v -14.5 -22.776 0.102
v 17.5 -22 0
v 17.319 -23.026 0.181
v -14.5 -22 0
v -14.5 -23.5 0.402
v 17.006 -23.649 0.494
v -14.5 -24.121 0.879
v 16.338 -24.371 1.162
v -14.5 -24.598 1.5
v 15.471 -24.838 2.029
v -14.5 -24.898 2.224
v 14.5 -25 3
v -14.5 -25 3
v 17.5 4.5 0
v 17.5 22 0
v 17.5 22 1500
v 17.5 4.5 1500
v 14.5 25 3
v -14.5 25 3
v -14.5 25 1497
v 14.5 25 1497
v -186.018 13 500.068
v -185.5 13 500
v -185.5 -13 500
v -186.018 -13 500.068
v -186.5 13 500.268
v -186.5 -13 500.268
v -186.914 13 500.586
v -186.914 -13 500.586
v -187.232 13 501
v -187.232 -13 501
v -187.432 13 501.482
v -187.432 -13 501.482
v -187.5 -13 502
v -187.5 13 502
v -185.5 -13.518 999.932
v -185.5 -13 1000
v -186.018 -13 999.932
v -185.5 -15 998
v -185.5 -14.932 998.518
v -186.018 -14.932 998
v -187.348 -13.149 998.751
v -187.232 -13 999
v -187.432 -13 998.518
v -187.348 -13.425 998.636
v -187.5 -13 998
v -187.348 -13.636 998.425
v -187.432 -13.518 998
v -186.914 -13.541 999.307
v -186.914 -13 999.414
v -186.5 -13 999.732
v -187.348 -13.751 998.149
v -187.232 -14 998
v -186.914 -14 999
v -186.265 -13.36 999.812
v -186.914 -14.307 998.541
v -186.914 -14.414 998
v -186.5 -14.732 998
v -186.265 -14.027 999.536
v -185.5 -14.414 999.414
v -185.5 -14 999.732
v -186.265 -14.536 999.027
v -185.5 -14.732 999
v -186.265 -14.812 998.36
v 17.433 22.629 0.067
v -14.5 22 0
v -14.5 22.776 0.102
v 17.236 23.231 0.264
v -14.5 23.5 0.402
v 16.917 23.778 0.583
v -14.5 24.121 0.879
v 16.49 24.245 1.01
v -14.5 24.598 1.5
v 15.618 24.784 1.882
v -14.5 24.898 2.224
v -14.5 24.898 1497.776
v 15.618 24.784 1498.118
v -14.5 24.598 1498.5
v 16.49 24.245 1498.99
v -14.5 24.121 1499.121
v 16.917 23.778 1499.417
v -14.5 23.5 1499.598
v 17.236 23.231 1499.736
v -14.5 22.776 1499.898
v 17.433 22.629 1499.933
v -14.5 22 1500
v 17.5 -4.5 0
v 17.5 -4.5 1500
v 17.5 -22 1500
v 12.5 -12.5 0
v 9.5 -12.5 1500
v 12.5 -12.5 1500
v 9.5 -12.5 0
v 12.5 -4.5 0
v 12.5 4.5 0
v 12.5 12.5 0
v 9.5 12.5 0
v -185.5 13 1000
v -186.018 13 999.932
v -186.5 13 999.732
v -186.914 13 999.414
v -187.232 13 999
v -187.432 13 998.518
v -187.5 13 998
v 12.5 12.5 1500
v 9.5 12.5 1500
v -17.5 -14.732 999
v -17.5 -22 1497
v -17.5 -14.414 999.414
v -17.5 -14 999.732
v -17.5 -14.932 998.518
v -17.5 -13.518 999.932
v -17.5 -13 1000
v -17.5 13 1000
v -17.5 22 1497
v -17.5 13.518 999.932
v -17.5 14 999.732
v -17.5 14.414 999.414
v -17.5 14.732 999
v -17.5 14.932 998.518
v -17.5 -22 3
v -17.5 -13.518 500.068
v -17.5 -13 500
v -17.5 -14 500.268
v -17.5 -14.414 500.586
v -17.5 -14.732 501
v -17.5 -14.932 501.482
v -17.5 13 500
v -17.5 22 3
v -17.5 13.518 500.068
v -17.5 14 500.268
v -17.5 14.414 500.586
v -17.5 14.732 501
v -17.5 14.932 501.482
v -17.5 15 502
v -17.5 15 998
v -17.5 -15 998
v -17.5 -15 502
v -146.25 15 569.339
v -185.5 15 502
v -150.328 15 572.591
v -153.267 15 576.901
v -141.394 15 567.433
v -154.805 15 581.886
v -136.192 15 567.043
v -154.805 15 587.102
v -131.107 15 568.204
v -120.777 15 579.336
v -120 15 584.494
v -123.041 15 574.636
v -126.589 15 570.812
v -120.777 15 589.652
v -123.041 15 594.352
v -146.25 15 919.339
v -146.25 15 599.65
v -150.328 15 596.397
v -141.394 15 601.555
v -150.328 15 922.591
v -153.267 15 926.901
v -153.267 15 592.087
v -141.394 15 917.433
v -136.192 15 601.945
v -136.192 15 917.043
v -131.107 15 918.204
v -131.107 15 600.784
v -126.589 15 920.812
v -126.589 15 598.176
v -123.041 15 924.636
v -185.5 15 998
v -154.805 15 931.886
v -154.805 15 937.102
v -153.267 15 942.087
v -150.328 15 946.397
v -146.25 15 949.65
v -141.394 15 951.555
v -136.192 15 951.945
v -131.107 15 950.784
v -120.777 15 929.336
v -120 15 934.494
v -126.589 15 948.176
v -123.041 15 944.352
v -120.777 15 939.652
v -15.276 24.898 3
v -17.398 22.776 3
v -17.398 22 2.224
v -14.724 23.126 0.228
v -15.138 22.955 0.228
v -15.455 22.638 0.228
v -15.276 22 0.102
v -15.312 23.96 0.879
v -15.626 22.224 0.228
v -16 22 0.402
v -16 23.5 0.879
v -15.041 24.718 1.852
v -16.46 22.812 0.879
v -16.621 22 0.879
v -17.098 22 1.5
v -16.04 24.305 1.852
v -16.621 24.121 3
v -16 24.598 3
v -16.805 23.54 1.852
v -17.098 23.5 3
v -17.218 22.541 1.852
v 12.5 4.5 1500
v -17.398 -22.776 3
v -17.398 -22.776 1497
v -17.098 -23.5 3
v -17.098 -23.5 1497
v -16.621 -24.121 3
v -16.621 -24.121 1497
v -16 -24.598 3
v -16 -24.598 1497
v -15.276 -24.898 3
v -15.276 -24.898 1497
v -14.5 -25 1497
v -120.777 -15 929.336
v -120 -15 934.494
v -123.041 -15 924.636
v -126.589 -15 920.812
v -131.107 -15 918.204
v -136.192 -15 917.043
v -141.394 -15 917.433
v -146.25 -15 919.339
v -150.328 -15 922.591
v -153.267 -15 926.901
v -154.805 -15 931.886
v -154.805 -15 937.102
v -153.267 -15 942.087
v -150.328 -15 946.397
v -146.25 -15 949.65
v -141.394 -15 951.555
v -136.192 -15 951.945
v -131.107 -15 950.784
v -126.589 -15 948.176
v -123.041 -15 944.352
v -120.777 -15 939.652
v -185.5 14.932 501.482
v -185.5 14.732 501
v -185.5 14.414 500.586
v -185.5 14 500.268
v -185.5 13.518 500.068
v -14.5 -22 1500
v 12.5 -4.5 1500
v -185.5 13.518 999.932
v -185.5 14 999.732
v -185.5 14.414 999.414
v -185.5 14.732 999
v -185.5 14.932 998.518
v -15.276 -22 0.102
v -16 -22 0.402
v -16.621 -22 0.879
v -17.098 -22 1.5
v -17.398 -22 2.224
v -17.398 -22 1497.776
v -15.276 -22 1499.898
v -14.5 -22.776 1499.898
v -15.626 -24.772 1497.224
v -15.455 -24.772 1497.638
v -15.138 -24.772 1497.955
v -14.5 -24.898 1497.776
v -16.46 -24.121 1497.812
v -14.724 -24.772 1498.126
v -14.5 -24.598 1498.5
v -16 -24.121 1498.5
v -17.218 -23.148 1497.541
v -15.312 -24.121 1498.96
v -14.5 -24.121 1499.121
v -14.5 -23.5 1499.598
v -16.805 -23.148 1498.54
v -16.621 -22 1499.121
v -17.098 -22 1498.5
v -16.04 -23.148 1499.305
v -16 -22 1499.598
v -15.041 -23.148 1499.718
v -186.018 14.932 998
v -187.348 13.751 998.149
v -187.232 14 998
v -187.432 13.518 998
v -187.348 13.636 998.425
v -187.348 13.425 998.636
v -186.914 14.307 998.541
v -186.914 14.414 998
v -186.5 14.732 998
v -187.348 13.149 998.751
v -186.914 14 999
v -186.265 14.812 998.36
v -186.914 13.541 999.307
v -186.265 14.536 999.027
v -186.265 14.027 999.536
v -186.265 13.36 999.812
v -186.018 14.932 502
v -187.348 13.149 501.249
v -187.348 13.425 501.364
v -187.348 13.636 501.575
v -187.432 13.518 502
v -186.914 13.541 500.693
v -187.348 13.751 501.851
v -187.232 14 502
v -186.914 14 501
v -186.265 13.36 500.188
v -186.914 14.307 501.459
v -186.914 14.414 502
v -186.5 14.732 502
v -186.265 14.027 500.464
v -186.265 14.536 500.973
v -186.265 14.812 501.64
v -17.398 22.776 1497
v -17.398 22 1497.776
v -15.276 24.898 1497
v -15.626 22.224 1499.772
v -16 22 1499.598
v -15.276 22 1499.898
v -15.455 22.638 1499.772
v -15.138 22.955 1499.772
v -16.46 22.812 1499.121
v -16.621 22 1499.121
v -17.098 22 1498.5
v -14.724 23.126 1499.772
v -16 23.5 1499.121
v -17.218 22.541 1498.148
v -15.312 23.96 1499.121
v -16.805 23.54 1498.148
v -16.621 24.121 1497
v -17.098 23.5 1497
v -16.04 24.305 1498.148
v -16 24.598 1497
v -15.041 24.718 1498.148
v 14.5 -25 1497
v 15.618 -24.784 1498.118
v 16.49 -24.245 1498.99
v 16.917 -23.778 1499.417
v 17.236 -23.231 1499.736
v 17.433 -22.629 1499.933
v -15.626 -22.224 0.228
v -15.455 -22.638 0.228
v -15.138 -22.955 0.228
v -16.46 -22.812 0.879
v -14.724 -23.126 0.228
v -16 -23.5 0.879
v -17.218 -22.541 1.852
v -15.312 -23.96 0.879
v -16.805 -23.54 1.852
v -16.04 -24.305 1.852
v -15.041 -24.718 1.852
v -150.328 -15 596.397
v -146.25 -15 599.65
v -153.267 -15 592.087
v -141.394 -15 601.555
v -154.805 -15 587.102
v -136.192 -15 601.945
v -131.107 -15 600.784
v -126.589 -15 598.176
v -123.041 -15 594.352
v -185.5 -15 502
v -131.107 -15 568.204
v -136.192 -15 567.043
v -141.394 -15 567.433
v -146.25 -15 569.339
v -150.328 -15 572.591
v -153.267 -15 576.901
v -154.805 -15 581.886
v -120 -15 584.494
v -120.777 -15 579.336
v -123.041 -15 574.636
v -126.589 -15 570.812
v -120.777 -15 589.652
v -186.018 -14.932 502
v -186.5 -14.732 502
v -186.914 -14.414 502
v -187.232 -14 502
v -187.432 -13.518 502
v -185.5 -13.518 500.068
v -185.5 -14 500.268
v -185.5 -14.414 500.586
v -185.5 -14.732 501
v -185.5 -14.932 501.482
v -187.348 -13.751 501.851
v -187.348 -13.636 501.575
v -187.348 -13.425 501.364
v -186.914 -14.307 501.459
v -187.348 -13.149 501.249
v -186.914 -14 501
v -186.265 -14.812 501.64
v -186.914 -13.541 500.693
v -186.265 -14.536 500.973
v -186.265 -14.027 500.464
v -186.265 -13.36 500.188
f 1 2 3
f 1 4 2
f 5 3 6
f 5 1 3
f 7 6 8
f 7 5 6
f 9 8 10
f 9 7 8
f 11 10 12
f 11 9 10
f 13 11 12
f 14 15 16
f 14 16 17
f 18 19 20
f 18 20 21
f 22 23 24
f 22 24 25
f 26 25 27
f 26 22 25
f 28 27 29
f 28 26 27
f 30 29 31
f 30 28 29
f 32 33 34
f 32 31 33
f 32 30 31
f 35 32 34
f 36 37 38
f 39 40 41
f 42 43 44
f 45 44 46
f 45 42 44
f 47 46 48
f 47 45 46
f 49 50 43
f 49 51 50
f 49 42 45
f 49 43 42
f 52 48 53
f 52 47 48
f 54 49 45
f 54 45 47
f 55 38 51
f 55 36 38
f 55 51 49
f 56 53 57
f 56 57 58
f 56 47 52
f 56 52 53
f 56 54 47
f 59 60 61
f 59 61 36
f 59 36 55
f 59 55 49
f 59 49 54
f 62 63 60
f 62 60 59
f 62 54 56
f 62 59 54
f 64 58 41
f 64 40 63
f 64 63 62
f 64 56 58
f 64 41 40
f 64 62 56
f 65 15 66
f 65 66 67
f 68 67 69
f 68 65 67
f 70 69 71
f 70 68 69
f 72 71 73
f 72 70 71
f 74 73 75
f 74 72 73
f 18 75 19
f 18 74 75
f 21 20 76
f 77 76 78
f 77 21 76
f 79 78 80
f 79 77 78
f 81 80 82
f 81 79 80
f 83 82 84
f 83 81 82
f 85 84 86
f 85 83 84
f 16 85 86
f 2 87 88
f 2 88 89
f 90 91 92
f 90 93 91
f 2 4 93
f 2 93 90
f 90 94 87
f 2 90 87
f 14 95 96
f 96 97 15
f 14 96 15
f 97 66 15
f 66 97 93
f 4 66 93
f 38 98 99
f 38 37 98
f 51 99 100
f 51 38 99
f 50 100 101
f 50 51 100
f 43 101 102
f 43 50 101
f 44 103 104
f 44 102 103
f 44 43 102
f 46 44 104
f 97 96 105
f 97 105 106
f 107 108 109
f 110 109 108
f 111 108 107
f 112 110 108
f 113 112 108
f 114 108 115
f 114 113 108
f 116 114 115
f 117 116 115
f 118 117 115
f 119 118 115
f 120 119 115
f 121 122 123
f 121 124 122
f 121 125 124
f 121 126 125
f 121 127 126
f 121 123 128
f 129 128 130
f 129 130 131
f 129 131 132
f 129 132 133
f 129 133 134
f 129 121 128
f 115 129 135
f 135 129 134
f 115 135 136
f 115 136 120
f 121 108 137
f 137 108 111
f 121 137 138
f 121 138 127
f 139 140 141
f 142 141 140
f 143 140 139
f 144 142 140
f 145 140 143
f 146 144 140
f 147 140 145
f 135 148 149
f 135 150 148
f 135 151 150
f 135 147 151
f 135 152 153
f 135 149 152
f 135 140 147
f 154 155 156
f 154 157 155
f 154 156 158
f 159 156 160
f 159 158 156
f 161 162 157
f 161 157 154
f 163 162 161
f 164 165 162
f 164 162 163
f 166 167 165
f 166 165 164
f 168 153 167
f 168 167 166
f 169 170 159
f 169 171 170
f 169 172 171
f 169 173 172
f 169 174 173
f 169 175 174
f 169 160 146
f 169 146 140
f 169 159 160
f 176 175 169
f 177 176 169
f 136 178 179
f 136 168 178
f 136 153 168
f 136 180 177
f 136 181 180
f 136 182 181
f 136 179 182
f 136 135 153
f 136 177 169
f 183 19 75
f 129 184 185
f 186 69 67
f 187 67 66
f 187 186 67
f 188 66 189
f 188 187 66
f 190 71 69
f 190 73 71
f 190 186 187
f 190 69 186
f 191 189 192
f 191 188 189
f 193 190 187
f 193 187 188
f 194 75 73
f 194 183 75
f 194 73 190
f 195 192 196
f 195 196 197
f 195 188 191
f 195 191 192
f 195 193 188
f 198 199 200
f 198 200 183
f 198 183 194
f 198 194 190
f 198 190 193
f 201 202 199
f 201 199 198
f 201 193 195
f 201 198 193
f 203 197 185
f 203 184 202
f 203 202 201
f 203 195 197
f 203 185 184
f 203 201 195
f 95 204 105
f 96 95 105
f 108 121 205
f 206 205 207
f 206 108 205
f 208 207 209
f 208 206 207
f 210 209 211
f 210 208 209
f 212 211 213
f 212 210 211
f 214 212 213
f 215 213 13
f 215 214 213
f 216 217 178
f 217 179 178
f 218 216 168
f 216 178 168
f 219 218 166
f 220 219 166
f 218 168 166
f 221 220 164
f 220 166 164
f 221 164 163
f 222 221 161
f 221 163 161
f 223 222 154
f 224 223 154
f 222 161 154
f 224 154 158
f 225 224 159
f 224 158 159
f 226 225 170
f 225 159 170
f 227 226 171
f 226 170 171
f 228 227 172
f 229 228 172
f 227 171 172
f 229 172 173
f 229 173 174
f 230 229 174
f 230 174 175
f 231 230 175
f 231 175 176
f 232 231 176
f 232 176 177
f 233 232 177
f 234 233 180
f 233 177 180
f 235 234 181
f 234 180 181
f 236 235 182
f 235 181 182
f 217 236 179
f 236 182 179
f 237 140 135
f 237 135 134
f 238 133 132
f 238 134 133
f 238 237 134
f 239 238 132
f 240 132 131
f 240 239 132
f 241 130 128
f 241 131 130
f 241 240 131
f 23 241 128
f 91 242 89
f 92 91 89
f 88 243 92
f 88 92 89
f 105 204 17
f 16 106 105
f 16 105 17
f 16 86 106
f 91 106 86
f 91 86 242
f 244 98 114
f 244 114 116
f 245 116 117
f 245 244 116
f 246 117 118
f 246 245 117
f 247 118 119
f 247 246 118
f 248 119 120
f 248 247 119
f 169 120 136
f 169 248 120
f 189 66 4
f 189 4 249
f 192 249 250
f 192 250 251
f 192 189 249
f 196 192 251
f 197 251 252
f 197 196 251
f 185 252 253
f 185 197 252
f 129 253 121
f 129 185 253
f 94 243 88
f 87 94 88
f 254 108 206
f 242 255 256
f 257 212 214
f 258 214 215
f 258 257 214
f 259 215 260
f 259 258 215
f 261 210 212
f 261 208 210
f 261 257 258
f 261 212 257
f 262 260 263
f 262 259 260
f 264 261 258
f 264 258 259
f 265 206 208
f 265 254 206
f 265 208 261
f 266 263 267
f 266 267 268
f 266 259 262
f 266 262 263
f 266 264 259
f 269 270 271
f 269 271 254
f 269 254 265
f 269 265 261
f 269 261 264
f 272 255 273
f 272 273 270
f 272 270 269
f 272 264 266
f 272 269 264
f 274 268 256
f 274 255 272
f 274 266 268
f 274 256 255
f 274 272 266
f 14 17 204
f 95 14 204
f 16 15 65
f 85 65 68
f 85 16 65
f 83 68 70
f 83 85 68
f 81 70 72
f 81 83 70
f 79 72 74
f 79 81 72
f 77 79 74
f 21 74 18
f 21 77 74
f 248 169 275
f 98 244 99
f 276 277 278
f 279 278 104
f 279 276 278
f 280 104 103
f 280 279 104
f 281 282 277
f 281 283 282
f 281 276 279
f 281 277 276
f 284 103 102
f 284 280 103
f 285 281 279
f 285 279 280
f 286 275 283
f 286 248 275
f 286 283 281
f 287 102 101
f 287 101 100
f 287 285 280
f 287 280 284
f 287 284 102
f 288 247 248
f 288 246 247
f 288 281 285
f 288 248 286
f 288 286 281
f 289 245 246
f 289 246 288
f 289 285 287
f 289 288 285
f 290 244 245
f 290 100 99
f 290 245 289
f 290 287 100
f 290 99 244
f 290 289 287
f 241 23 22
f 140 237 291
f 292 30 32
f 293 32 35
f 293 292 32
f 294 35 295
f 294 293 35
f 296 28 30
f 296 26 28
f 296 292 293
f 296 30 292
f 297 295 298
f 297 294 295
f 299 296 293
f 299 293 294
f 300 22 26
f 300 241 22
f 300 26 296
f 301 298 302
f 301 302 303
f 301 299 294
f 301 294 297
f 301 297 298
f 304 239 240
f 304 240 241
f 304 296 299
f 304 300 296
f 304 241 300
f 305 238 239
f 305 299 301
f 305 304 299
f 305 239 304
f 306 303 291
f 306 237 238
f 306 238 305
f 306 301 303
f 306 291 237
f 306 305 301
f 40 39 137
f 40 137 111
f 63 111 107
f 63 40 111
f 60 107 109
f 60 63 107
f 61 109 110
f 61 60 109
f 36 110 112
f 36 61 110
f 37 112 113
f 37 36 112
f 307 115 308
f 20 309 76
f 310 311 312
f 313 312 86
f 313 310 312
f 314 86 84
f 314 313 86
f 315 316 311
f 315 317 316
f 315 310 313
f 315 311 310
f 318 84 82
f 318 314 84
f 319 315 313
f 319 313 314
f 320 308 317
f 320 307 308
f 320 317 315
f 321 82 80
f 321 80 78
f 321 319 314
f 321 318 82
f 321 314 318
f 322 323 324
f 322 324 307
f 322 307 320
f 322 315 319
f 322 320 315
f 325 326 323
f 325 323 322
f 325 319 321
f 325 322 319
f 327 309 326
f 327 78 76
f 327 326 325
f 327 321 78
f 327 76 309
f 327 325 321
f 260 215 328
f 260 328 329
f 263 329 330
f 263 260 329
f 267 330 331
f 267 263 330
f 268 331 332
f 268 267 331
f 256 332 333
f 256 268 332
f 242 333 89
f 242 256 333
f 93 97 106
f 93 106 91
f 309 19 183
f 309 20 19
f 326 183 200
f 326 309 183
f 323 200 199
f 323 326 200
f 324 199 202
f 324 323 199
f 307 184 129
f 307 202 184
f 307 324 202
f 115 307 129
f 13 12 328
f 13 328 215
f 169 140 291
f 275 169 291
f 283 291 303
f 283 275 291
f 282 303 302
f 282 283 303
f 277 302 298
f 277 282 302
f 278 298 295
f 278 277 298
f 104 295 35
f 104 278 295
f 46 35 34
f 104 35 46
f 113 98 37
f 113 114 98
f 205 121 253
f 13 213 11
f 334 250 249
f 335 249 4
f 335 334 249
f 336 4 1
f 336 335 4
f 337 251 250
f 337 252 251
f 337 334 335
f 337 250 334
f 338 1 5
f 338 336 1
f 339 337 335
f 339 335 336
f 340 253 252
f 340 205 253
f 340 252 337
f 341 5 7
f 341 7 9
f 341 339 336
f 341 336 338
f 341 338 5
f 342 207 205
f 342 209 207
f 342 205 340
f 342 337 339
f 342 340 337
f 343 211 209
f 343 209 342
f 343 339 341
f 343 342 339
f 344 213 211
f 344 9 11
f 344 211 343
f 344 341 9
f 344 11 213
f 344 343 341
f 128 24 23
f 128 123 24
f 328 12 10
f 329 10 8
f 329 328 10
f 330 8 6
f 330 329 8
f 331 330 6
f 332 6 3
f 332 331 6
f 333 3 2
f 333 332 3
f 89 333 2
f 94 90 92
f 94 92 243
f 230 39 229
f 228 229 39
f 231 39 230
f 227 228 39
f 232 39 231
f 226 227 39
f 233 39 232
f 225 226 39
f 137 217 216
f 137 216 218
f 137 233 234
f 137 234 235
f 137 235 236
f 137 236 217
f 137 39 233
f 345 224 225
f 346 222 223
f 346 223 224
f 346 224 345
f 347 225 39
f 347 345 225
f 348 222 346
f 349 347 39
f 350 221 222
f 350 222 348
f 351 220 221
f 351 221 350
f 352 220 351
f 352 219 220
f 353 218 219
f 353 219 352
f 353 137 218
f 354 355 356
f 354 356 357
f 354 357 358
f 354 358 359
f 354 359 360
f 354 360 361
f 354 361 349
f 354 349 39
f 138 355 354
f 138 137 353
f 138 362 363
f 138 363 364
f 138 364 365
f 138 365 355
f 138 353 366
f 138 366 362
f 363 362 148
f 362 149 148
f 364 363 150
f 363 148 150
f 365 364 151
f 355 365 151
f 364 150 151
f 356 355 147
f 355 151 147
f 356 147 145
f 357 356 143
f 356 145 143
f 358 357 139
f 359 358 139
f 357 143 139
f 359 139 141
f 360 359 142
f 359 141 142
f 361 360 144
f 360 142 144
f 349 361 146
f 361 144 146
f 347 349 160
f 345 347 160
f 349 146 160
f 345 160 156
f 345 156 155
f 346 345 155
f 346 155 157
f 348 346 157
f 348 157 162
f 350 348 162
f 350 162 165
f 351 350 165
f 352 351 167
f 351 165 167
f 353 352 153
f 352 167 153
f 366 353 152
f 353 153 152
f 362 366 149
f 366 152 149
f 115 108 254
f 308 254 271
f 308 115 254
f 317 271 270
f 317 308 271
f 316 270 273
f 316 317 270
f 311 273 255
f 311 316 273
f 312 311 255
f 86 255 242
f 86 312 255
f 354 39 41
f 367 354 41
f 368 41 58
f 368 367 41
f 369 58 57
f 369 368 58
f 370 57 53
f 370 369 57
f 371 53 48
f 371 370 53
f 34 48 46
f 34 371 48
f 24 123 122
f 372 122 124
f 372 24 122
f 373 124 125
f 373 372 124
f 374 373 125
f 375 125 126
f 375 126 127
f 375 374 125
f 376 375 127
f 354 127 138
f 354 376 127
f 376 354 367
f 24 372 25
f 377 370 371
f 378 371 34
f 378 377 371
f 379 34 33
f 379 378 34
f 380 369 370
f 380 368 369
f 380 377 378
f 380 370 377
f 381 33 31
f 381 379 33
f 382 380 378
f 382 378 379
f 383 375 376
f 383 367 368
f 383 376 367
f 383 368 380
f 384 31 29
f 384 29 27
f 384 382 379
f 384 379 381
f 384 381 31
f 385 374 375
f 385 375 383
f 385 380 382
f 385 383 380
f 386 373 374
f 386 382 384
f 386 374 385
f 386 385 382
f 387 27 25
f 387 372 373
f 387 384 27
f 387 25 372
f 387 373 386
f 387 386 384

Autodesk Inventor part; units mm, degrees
ref_plane "YZ Plane" through (0, 0, 0) normal (1, 0, 0) x (0, 1, 0)
ref_plane "XZ Plane" through (0, 0, 0) normal (0, 1, 0) x (-1, 0, 0)
ref_plane "XY Plane" through (0, 0, 0) normal (0, 0, 1) x (1, 0, 0)
sketch "Sketch1" plane through (0, 0, 0) normal (0, 0, 1) x (1, 0, 0)
  line L0 (-17.5, 25) -> (17.5, 25)
  line L1 (17.5, 25) -> (17.5, -25)
  line L2 (17.5, -25) -> (-17.5, -25)
  line L3 (-17.5, -25) -> (-17.5, 25)
  line L4 (17.5, 4.5) -> (12.5, 4.5)
  line L5 (12.5, 4.5) -> (12.5, -4.5)
  line L6 (12.5, -4.5) -> (17.5, -4.5)
  line L7 (17.5, -4.5) -> (17.5, 4.5)
  line L8 (12.5, 12.5) -> (9.5, 12.5)
  line L9 (9.5, 12.5) -> (9.5, -12.5)
  line L10 (9.5, -12.5) -> (12.5, -12.5)
  line L11 (12.5, -12.5) -> (12.5, 12.5)
  point P0 (0, 0)
  point P1 (0, 25)
  point P2 (-17.5, 0)
  point P3 (12.5, 0)
  point P4 (9.5, 0)
  dimension "d0" = 35
  dimension "d1" = 50
  dimension "d7" = 5
  dimension "d8" = 9
  dimension "d9" = 3
  dimension "d10" = 25
extrude "Extrusion1" add sketch "Sketch1" along normal blind 1500 contours L0 L1 L4 L11 L8 L9 L10 L6 L2 L3
fillet "Fillet2" radius 3 10 edges at (17.5, 25, 750) (-17.5, 25, 750) (0, 25, 1500) (-17.5, 0, 1500) (0, -25, 1500) (-17.5, -25, 750) (17.5, -25, 750) (-17.5, 0, 0) (0, 25, 0) (0, -25, 0)
sketch "Sketch3" plane through (-17.5, -22, 3) normal (-1, 0, 0) x (0, 0, 1)
  line L0 (497, 37) -> (997, 37)
  line L1 (997, 37) -> (997, 7)
  line L2 (997, 7) -> (497, 7)
  line L3 (497, 7) -> (497, 37)
  point P0 (-3, 22)
  point P1 (497, 22)
  point P2 (747, 37)
  dimension "d12" = 500
  dimension "d13" = 30
  dimension "d14" = 750
extrude "Extrusion2" add sketch "Sketch3" along normal blind 170
fillet "Fillet3" radius 2 8 edges at (-102.5, -15, 500) (-102.5, 15, 500) (-102.5, 15, 1000) (-102.5, -15, 1000) (-187.5, 15, 750) (-187.5, -15, 750) (-187.5, 0, 500) (-187.5, 0, 1000)
sketch "Sketch4" plane through (-17.5, 15, 998) normal (0, 1, 0) x (1, 0, 0)
  circle A0 centre (-120, 63.5059) radius 17.5
  circle A1 centre (-120, 413.5059) radius 17.5
  line L0 (0, 0) -> (-168, 0) projected
  line L1 (0, 496) -> (0, 0) projected
  point P0 (17.5, 998)
  point P1 (-84, 0)
  point P2 (-84, 0)
  dimension "d18" = 35
  dimension "d19" = 35
  dimension "d20" = 350
  dimension "d21" = 73
  dimension "d24" = 120
extrude "Extrusion3" cut sketch "Sketch4" against normal blind 150
properties part number "Soporte Boquillas"
